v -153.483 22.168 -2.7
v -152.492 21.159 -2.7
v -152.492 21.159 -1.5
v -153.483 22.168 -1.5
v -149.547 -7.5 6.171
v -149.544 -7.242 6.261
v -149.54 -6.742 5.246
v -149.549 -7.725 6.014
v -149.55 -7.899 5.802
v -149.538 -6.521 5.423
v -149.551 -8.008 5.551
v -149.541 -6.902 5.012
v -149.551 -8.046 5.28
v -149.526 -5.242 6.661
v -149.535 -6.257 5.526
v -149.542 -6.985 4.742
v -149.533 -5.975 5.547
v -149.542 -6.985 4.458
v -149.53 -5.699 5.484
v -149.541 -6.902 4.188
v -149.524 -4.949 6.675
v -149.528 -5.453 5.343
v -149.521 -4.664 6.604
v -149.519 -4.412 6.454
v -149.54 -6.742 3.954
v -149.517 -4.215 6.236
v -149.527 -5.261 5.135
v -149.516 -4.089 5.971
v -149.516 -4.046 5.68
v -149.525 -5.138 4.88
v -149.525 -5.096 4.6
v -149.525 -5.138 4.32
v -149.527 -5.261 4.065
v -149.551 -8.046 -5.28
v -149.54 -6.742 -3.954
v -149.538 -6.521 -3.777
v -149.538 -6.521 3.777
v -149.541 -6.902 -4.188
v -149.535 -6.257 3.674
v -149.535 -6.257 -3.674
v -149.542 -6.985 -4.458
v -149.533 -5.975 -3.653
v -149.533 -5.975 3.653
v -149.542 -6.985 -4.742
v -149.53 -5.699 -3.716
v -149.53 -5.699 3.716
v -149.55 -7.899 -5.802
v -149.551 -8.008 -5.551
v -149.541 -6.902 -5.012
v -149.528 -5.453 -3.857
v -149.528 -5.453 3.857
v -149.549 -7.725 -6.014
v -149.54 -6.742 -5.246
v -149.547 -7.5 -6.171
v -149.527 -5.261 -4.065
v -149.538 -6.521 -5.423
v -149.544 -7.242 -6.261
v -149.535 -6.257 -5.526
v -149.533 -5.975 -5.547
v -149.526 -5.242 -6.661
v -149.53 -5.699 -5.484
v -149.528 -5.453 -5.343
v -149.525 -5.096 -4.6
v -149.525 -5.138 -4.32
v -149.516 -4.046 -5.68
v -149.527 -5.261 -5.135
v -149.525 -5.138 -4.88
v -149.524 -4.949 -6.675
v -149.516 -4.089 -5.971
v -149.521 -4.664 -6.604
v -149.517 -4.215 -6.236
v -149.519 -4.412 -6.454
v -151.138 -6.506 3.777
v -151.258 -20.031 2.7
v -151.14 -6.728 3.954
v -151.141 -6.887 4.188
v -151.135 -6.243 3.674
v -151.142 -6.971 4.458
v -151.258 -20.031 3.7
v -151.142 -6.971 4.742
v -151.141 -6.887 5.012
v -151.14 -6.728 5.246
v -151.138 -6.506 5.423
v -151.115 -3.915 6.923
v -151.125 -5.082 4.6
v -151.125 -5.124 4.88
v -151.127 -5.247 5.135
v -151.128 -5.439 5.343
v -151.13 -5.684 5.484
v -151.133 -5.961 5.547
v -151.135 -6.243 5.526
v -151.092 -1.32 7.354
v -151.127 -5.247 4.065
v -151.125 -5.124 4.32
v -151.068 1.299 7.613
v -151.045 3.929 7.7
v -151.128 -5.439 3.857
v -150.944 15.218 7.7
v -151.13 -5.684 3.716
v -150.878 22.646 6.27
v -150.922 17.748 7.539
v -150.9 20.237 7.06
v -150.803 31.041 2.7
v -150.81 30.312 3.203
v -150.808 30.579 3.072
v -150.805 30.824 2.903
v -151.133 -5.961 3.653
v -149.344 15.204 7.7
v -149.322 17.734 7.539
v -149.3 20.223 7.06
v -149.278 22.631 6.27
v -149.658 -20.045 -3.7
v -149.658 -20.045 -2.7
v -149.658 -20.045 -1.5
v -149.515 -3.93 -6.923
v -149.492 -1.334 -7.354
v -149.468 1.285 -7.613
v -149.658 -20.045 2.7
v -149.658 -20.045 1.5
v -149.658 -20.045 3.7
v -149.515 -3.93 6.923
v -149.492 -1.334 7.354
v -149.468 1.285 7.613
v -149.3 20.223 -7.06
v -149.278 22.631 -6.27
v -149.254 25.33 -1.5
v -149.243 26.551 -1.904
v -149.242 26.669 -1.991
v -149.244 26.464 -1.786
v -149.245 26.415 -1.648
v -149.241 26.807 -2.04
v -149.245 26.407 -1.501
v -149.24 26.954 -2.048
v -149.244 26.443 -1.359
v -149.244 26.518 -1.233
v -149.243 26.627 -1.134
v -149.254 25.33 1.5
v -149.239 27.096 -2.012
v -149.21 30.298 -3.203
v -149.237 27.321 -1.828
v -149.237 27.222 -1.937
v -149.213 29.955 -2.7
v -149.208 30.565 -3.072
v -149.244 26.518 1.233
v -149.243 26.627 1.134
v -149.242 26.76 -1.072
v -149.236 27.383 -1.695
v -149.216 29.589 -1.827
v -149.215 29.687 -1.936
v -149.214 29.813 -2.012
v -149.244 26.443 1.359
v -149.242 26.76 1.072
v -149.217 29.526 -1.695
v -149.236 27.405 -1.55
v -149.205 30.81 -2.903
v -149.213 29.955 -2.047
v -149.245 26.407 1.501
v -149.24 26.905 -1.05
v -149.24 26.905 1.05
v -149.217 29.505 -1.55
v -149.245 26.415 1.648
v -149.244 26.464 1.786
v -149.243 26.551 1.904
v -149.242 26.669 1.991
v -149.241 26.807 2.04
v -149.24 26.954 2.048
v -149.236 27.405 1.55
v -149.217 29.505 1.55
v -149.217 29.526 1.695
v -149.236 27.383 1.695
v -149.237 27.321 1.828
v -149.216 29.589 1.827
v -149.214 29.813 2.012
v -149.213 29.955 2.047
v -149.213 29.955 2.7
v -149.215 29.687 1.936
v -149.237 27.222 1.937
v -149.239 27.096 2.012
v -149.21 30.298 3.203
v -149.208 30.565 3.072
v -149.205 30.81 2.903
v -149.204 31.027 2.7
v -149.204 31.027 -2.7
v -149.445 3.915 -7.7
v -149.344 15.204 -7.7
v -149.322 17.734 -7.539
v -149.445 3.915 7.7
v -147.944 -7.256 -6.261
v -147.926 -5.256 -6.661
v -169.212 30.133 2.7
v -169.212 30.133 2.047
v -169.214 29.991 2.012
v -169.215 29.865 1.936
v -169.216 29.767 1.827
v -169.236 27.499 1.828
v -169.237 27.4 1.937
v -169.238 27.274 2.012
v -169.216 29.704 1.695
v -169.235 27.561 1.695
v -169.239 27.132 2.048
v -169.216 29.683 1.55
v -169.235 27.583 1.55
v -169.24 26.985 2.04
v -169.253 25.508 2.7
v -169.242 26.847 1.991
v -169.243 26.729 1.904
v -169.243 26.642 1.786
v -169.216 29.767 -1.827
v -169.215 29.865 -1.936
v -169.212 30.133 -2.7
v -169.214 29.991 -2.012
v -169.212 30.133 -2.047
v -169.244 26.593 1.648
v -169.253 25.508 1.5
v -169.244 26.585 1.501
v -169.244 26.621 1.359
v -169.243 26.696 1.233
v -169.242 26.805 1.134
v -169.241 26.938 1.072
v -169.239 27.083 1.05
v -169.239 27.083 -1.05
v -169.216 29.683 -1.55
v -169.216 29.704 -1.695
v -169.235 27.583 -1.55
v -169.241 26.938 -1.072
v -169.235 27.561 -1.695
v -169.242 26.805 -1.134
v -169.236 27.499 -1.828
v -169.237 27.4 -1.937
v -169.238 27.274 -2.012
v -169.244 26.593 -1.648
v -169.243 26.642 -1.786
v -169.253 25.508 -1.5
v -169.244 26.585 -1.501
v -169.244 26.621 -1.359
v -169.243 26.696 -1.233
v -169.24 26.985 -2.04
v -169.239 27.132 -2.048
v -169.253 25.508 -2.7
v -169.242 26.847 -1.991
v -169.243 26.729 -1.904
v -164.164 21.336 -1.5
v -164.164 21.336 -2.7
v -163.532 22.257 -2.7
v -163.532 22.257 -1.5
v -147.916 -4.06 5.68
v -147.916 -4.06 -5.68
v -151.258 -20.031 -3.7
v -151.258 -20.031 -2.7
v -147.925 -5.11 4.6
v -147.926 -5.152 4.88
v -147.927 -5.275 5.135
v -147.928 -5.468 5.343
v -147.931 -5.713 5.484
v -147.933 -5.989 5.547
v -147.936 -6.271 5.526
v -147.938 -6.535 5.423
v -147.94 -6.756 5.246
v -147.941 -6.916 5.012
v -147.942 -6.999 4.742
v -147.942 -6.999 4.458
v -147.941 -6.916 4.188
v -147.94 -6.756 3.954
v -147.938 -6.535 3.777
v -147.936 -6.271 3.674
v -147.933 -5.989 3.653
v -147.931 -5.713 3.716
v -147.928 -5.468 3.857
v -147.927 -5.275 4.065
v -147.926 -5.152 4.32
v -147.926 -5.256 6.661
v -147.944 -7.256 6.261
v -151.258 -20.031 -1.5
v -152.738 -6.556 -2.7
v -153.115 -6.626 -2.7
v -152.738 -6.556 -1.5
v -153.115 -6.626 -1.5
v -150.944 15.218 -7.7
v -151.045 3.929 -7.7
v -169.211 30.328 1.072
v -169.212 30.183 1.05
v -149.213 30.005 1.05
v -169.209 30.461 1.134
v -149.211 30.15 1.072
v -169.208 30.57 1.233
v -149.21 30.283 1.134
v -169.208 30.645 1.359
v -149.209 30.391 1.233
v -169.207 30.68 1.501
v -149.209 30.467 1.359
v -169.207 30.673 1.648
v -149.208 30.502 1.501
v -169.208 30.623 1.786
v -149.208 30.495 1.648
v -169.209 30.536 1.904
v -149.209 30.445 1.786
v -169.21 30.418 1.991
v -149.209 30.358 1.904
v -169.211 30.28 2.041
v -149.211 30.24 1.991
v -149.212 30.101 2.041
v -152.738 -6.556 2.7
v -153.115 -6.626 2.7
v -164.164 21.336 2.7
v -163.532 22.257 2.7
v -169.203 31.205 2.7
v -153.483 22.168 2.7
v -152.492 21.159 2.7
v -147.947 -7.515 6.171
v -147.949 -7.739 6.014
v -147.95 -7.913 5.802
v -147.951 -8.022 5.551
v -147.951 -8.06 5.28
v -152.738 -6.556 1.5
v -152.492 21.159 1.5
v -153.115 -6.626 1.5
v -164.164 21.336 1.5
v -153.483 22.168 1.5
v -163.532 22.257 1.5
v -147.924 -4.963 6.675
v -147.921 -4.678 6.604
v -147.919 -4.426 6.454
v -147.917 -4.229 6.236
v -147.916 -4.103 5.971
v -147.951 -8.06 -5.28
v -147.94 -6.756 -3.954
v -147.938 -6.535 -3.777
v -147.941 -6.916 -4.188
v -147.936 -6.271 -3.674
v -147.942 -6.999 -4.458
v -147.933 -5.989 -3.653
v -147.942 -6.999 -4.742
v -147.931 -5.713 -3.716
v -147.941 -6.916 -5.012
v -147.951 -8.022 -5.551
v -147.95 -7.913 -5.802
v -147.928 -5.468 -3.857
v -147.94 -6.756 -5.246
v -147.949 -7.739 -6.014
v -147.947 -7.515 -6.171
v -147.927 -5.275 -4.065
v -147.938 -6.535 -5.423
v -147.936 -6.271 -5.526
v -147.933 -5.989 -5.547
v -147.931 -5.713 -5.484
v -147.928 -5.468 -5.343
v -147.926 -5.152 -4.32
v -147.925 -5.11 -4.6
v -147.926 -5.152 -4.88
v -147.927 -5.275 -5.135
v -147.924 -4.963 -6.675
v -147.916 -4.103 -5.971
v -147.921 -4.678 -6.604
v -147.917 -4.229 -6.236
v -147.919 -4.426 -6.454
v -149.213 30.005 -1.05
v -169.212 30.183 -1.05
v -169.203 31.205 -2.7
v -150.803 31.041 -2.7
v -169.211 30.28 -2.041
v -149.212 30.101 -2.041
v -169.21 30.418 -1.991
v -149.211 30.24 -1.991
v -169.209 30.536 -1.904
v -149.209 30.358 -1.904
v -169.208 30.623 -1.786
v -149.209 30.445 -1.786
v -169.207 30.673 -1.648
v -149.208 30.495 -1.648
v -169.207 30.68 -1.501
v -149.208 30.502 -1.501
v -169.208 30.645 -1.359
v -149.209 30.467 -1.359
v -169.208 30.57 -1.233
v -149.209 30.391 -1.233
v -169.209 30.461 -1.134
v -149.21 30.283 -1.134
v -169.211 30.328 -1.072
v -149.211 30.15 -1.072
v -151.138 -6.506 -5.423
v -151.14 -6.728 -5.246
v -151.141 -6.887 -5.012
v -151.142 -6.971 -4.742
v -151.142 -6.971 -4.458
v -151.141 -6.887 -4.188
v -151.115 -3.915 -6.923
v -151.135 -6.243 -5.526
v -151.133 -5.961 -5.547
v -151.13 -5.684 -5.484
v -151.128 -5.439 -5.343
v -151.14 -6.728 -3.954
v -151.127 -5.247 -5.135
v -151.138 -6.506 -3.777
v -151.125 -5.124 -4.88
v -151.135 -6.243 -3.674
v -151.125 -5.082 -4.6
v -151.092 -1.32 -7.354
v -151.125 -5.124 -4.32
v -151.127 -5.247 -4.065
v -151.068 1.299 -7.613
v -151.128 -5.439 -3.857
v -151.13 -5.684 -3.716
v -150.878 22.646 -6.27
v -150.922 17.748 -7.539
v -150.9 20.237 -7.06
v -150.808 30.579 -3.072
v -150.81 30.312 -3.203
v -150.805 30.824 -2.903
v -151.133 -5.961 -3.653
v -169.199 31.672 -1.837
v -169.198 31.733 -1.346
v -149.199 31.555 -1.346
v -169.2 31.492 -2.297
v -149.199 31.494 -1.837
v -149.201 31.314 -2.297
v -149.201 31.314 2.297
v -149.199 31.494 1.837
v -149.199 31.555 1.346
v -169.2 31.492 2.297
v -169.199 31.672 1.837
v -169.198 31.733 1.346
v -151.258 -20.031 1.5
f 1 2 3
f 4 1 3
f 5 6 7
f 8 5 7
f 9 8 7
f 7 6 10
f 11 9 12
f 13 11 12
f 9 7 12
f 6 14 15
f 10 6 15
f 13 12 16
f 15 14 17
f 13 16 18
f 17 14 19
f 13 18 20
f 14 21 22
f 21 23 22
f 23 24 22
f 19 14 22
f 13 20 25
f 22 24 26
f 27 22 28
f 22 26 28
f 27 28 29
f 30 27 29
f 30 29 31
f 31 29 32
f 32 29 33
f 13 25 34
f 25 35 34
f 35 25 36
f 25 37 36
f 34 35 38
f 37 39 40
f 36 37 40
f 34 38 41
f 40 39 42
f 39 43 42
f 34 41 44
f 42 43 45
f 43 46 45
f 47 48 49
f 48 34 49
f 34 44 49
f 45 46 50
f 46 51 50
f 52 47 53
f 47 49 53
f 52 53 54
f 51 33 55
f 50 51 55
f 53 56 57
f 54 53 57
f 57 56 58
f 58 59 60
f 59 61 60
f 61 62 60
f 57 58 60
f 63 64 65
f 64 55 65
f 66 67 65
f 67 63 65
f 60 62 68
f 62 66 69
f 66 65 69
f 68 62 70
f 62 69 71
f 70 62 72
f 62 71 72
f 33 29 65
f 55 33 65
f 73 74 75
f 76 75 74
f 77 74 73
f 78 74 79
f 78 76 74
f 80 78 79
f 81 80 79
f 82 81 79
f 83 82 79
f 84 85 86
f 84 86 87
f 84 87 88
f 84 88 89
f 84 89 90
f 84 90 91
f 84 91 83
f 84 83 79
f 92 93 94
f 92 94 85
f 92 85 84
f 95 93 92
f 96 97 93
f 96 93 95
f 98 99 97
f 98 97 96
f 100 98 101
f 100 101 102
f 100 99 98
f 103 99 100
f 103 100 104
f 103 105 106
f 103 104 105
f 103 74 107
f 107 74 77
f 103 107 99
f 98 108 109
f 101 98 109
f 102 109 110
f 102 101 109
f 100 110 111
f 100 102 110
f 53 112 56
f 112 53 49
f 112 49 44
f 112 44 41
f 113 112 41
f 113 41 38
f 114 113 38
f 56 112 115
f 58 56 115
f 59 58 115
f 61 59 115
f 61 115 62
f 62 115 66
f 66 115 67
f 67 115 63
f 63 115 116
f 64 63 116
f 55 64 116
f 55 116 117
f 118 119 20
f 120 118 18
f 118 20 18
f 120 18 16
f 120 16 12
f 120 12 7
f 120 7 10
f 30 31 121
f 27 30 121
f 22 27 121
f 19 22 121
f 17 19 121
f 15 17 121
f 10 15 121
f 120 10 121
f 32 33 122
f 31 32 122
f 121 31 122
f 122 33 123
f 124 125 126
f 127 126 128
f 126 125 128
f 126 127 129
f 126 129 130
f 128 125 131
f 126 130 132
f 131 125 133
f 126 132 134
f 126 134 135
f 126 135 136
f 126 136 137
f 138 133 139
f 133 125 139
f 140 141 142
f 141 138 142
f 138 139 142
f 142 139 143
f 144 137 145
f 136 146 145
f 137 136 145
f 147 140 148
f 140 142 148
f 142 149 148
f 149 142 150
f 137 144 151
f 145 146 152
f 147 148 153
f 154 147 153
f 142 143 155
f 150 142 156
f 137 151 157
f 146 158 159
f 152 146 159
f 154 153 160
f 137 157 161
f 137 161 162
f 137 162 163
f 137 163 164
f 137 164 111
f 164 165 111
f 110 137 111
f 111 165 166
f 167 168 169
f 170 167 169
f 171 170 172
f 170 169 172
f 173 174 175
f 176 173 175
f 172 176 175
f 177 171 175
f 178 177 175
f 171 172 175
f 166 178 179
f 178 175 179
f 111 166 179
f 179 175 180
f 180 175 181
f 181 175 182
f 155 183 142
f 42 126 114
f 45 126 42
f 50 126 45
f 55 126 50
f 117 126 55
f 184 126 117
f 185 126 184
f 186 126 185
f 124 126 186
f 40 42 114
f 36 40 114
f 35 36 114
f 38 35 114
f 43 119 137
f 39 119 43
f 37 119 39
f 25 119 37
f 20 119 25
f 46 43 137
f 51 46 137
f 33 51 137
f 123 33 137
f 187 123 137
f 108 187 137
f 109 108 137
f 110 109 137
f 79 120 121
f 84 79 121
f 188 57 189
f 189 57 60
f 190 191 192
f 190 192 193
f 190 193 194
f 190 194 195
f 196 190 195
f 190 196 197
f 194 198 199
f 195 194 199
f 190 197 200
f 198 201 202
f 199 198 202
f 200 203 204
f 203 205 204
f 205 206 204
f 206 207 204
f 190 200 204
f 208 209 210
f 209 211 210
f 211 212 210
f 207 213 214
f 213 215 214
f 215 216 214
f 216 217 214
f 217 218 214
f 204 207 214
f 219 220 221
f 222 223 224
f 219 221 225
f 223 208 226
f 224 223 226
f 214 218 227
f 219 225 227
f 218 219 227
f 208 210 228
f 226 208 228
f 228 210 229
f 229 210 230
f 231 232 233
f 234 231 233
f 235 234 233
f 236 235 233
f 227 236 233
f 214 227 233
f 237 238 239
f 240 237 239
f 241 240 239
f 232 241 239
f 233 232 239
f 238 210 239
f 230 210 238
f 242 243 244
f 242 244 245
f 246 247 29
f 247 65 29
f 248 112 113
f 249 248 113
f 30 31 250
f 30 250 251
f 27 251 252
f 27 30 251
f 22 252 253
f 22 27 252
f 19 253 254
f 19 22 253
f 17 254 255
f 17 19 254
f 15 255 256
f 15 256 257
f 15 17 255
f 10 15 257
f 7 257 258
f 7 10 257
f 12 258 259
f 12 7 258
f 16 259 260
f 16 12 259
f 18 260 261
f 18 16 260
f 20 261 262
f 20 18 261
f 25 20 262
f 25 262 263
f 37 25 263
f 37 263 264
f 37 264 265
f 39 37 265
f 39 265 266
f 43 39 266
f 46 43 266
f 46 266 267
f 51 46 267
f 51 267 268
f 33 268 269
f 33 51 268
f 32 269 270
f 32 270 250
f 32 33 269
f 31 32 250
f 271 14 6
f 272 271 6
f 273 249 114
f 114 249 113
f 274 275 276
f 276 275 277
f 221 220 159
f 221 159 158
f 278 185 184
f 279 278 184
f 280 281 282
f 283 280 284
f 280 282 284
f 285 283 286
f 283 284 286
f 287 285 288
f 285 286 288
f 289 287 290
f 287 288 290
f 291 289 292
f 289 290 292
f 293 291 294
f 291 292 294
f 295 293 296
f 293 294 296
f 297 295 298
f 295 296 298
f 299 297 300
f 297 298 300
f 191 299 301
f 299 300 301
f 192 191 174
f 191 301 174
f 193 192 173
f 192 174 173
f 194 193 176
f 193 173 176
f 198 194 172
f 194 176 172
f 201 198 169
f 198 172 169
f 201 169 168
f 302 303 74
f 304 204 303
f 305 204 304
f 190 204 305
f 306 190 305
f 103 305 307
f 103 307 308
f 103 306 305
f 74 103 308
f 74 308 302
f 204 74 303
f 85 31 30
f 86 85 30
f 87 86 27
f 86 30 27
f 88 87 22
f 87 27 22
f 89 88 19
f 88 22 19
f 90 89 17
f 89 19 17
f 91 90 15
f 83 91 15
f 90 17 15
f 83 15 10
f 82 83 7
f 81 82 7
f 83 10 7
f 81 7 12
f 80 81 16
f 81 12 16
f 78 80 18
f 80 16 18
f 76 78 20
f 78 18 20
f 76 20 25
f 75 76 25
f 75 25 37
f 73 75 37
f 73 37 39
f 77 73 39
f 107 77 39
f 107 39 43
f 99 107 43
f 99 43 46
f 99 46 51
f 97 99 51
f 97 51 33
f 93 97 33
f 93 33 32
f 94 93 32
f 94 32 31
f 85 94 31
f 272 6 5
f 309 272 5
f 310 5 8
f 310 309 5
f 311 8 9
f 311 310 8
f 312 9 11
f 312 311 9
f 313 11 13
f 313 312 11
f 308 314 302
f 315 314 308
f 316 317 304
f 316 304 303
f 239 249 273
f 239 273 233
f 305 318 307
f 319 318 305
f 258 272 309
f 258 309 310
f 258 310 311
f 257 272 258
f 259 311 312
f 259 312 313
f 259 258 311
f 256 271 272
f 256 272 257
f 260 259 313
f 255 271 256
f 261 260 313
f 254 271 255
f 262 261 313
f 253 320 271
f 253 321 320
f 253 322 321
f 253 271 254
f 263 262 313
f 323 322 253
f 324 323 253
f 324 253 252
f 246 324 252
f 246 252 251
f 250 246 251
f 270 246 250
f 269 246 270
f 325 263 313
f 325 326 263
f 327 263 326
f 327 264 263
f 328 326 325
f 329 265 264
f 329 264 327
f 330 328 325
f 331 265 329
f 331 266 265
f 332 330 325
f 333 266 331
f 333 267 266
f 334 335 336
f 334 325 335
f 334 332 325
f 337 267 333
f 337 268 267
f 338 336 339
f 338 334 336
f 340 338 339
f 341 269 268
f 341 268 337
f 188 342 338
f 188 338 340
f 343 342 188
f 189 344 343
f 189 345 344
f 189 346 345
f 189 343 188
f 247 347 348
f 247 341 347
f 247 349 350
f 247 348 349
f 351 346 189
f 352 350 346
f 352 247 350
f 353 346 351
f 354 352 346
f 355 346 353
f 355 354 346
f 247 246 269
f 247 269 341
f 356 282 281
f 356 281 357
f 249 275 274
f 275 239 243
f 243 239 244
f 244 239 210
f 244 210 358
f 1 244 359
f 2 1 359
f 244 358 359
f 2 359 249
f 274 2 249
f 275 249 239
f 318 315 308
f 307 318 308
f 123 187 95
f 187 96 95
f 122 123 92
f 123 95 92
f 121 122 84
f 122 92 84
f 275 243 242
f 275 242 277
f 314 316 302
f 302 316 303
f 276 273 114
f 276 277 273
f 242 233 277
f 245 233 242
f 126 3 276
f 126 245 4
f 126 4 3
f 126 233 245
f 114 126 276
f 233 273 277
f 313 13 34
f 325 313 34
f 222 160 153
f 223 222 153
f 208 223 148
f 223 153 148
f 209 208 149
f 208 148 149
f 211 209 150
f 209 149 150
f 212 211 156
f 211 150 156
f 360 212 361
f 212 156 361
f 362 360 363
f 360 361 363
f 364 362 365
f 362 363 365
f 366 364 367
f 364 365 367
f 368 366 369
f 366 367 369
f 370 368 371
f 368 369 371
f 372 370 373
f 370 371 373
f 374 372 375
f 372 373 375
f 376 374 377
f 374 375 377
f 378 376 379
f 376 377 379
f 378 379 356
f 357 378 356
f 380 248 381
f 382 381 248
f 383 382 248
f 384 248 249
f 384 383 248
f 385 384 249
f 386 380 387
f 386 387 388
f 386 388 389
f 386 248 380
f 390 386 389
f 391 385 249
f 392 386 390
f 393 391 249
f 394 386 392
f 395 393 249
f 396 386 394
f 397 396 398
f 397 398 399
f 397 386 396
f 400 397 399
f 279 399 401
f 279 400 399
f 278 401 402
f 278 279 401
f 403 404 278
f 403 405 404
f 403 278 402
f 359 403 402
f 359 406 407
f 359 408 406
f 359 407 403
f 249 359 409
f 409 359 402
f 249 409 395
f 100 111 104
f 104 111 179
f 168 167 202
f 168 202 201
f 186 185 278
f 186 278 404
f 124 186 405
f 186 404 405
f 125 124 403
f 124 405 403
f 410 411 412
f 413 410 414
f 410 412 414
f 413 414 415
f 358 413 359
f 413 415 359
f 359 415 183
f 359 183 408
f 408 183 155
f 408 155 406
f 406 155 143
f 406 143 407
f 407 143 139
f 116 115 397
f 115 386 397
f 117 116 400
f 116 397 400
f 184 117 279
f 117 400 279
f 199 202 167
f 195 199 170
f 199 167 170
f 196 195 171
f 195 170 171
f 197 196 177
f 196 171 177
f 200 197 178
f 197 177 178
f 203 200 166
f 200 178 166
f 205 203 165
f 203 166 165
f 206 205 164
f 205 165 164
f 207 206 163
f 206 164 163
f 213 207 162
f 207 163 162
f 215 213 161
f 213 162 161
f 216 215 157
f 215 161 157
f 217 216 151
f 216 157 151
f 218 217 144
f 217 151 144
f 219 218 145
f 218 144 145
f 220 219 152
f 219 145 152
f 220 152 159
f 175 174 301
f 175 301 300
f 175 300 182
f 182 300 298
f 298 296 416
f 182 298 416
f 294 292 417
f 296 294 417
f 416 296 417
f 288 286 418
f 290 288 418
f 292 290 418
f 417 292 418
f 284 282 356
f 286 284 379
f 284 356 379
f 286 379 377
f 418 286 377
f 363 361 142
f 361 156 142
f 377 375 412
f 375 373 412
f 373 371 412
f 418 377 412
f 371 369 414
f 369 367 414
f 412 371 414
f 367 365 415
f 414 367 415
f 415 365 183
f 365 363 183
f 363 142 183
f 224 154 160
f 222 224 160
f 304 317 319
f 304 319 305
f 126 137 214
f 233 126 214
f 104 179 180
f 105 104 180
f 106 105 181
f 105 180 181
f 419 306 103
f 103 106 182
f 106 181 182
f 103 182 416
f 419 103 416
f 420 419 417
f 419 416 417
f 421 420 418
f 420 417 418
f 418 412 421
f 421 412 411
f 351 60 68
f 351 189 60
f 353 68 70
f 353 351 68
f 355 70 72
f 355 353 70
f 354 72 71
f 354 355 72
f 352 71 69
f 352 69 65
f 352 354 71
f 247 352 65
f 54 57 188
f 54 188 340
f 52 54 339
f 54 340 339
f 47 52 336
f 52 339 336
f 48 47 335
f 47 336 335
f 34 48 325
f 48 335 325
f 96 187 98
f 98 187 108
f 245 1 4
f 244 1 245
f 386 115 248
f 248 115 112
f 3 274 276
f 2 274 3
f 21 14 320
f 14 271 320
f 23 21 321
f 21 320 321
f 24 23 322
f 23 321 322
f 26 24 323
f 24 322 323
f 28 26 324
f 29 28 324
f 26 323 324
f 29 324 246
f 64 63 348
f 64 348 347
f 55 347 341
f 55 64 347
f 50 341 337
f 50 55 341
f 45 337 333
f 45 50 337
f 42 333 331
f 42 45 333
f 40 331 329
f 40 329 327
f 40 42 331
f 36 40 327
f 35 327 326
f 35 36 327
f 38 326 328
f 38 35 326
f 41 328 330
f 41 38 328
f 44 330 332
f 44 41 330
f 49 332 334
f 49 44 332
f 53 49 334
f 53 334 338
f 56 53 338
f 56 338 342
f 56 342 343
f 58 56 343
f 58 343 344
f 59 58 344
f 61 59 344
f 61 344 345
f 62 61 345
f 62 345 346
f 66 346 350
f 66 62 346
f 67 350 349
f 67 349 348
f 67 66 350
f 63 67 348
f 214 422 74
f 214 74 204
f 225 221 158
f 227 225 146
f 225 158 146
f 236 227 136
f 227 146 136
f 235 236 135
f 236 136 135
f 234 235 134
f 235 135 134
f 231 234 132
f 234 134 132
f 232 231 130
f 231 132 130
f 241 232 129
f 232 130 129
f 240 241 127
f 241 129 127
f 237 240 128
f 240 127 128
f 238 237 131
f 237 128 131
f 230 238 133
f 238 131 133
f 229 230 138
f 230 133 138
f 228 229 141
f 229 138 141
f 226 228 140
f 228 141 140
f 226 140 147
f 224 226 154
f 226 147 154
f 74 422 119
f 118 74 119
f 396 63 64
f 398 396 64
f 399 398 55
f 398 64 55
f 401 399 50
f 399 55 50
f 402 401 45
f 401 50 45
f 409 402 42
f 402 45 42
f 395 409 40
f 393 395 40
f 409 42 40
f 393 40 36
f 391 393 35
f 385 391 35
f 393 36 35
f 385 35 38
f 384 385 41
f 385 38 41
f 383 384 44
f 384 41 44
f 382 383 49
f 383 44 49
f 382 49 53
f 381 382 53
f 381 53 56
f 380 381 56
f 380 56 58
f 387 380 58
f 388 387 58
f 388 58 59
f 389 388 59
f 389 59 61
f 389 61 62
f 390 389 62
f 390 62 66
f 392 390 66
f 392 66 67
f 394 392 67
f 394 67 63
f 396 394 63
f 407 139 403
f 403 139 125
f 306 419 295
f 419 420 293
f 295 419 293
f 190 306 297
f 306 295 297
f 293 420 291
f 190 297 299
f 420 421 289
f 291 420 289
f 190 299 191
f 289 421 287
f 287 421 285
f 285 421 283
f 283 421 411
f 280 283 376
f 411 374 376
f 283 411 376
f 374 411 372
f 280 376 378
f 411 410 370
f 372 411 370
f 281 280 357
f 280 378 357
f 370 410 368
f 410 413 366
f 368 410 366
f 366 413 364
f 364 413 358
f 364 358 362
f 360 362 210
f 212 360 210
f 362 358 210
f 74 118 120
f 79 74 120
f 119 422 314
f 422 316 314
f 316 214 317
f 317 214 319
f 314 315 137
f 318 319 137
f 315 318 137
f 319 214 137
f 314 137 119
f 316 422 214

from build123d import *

# Parameters (mm, degrees)
BOSS_EXTRUDE1_DEPTH      = 1.5
BOSS_EXTRUDE2_DEPTH      = 2.7
BOSS_EXTRUDE2_DEPTH_BACK = 2.7
CUT_EXTRUDE1_DEPTH       = 1.5
BOSS_EXTRUDE3_DEPTH      = 1.6
CUT_EXTRUDE2_DEPTH       = 173.771231485
CUT_EXTRUDE2_DEPTH_BACK  = 173.771231485
CUT_EXTRUDE3_DEPTH       = 1.5
SKETCH9_W                = 3.1
SKETCH9_H                = 3.1
SKETCH9_W_2              = 3
SKETCH9_H_2              = 3
CUT_EXTRUDE4_DEPTH       = 38.081608425
SKETCH10_R               = 0.5
CUT_EXTRUDE5_DEPTH       = 38.081608425
CUT_EXTRUDE6_DEPTH       = 38.081608425
FILLET1_R                = 20
CUT_EXTRUDE7_DEPTH       = 38.081608425
FILLET2_R                = 40
SKETCH14_R               = 0.95
SKETCH14_W               = 1.2
SKETCH14_H               = 4
SKETCH14_W_2             = 3
BOSS_EXTRUDE4_DEPTH      = 1.6
SKETCH15_R               = 0.95
CUT_EXTRUDE8_DEPTH       = 38.081608425
FILLET3_R                = 1
CUT_EXTRUDE9_DEPTH       = 173.374562434
CUT_EXTRUDE9_DEPTH_BACK  = 173.374562434
CHAMFER1_SIZE            = 1


with BuildPart() as part:
    # Sketch3 → Boss-Extrude1 (new, symmetric)
    with BuildSketch(Plane.XY):
        Polygon((-149.213067775, 29.954800958), (-159.212671499, 30.043825512), (-159.65781191, -19.956174488), (-149.658208186, -20.045199042), align=None)
        Polygon((-159.65781191, -19.956174488), (-159.212671499, 30.043825512), (-169.212275222, 30.132850067), (-169.657415633, -19.867149933), align=None)
        Polygon((-149.198823847, 31.554737554), (-169.198031294, 31.732786662), (-169.212275222, 30.132850067), (-149.213067775, 29.954800958), align=None)
    extrude(amount=BOSS_EXTRUDE1_DEPTH, both=True)

    # Sketch4 → Boss-Extrude2 (add, two sides: drawn at the far end of the back side and taken through both)
    with BuildSketch(Plane.XY.offset(-BOSS_EXTRUDE2_DEPTH_BACK)):
        Polygon((-149.213067775, 29.954800958), (-159.212671499, 30.043825512), (-159.65781191, -19.956174488), (-149.658208186, -20.045199042), align=None)
        Polygon((-159.212671499, 30.043825512), (-169.212275222, 30.132850067), (-169.657415633, -19.867149933), (-159.65781191, -19.956174488), align=None)
        Polygon((-149.198823847, 31.554737554), (-169.198031294, 31.732786662), (-169.212275222, 30.132850067), (-149.213067775, 29.954800958), align=None)
    extrude(amount=BOSS_EXTRUDE2_DEPTH + BOSS_EXTRUDE2_DEPTH_BACK)

    # Sketch5 → Cut-Extrude1 (cut, symmetric)
    with BuildSketch(Plane.XY):
        Polygon((-149.658208186, -20.045199042), (-149.254241632, 25.329984236), (-169.253449079, 25.508033344), (-169.657415633, -19.867149933), align=None)
    extrude(amount=CUT_EXTRUDE1_DEPTH, both=True, mode=Mode.SUBTRACT)

    # Sketch6 → Boss-Extrude3 (add)
    with BuildSketch(Plane(origin=(-149.467902798, 1.330684074, 0), x_dir=(0, 0, -1), z_dir=(0.999960372358546, -0.00890245542299091, 0))):
        Polygon((-2.7, 30.225251236), (-2.7, -21.376730225), (-7.7, -21.376730225), (-7.7, 17.725251236), align=None)
        Polygon((2.7, -21.376730225), (2.7, 30.225251236), (7.7, 17.725251236), (7.7, -21.376730225), align=None)
    extrude(amount=-BOSS_EXTRUDE3_DEPTH)

    # Sketch7 → Cut-Extrude2 (cut, two sides: drawn at the far end of the back side and taken through both)
    with BuildSketch(Plane.XY.offset(-CUT_EXTRUDE2_DEPTH_BACK)):
        Polygon((-151.258144782, -20.030955113), (-169.253449079, 25.508033344), (-169.657415633, -19.867149933), align=None)
    extrude(amount=CUT_EXTRUDE2_DEPTH + CUT_EXTRUDE2_DEPTH_BACK, mode=Mode.SUBTRACT)

    # Sketch8 → Cut-Extrude3 (cut, symmetric)
    with BuildSketch(Plane.XY):
        Polygon((-371.727094297, 31.935800663), (-371.753801663, 28.935919545), (-39.244134182, 25.975649744), (-39.217426816, 28.975530862), align=None)
    extrude(amount=CUT_EXTRUDE3_DEPTH, both=True, mode=Mode.SUBTRACT)

    # Sketch9 → Cut-Extrude4 (cut, through all)
    with BuildSketch(Plane(origin=(-149.467902798, 1.330684074, 0), x_dir=(0, 0, -1), z_dir=(0.999960372358546, -0.00890245542299091, 0))):
        with Locations((0, 27.125251236)):
            Rectangle(SKETCH9_W, SKETCH9_H)
        with Locations((0, 27.125251236)):
            Rectangle(SKETCH9_W_2, SKETCH9_H_2, mode=Mode.SUBTRACT)
    extrude(amount=-CUT_EXTRUDE4_DEPTH, mode=Mode.SUBTRACT)

    # Sketch10 → Cut-Extrude5 (cut, through all)
    with BuildSketch(Plane(origin=(-149.467902798, 1.330684074, 0), x_dir=(0, 0, -1), z_dir=(0.999960372358546, -0.00890245542299091, 0))):
        with Locations((-1.55, 25.575251236)):
            Circle(SKETCH10_R)
        with Locations((1.55, 25.575251236)):
            Circle(SKETCH10_R)
        with Locations((-1.55, 28.675251236)):
            Circle(SKETCH10_R)
        with Locations((1.55, 28.675251236)):
            Circle(SKETCH10_R)
    extrude(amount=-CUT_EXTRUDE5_DEPTH, mode=Mode.SUBTRACT)

    # Sketch12 → Cut-Extrude6 (cut, through all)
    with BuildSketch(Plane(origin=(-149.467902798, 1.330684074, 0), x_dir=(0, 0, -1), z_dir=(0.999960372358546, -0.00890245542299091, 0))):
        with BuildLine():
            Line((-2.7, 30.225251236), (-3.202887459, 28.968032588))
            ThreePointArc((-3.202887459, 28.968032588), (-2.467191696, 29.881385696), (-1.345934077, 30.225251236))
            Line((-1.345934077, 30.225251236), (-2.7, 30.225251236))
        make_face()
        with BuildLine():
            ThreePointArc((1.345934077, 30.225251236), (2.467191696, 29.881385696), (3.202887459, 28.968032588))
            Line((3.202887459, 28.968032588), (2.7, 30.225251236))
            Line((2.7, 30.225251236), (1.345934077, 30.225251236))
        make_face()
    extrude(amount=-CUT_EXTRUDE6_DEPTH, mode=Mode.SUBTRACT)

    # Fillet1
    fillet1_edges = [part.edges().sort_by_distance(p)[0] for p in [
        (-150.110072837, 19.062354864, 7.7),
        (-150.110072837, 19.062354864, -7.7),
    ]]
    fillet(fillet1_edges, radius=FILLET1_R)

    # Sketch13 → Cut-Extrude7 (cut, through all)
    with BuildSketch(Plane(origin=(-149.467902798, 1.330684074, 0), x_dir=(0, 0, -1), z_dir=(0.999960372358546, -0.00890245542299091, 0))):
        Polygon((-7.7, -1.376730225), (-7.7, -21.376730225), (-3.7, -21.376730225), align=None)
        Polygon((7.7, -21.376730225), (7.7, -1.376730225), (3.7, -21.376730225), align=None)
    extrude(amount=-CUT_EXTRUDE7_DEPTH, mode=Mode.SUBTRACT)

    # Fillet2
    fillet2_edges = [part.edges().sort_by_distance(p)[0] for p in [
        (-150.280127376, -0.03886963, -7.7),
        (-150.280127376, -0.03886963, 7.7),
    ]]
    fillet(fillet2_edges, radius=FILLET2_R)

    # Sketch15 → Cut-Extrude8 (cut, through all)
    with BuildSketch(Plane(origin=(-149.467902798, 1.330684074, 0), x_dir=(0, 0, -1), z_dir=(0.999960372358546, -0.00890245542299091, 0))):
        with Locations(Location((-4.6, -7.376730225, 0), (0, 0, 90))):
            Circle(SKETCH15_R)
        with Locations(Location((4.6, -7.376730225, 0), (0, 0, 90))):
            Circle(SKETCH15_R)
    extrude(amount=-CUT_EXTRUDE8_DEPTH, mode=Mode.SUBTRACT)

    # Sketch16 → Cut-Extrude9 (cut, two sides: drawn at the far end of the back side and taken through both)
    with BuildSketch(Plane.XY.offset(-CUT_EXTRUDE9_DEPTH_BACK)):
        Polygon((-164.531480082, 22.265867746), (-152.747142701, -7.555623189), (-152.48260268, 22.158598902), align=None)
    extrude(amount=CUT_EXTRUDE9_DEPTH + CUT_EXTRUDE9_DEPTH_BACK, mode=Mode.SUBTRACT)

    # Chamfer1
    chamfer1_edges = [part.edges().sort_by_distance(p)[0] for p in [
        (-152.747142701, -7.555623189, -2.1),
        (-152.747142701, -7.555623189, 2.1),
        (-164.531480082, 22.265867746, -2.1),
        (-164.531480082, 22.265867746, 2.1),
        (-152.48260268, 22.158598902, -2.1),
        (-152.48260268, 22.158598902, 2.1),
    ]]
    chamfer(chamfer1_edges, length=CHAMFER1_SIZE)


with BuildPart() as body_2:
    # Sketch14 → Boss-Extrude4 (new body)
    # profile 1 of 5: a face of its own
    with BuildSketch(Plane(origin=(-149.467902798, 1.330684074, 0), x_dir=(0, 0, -1), z_dir=(0.999960372358546, -0.00890245542299091, 0))):
        Polygon((-2.7, -9.376730225), (-2.7, -5.376730225), (-6.9, -5.376730225), (-6.1, -9.376730225), align=None)
        with Locations(Location((-4.6, -7.376730225, 0), (0, 0, 90))):
            Circle(SKETCH14_R, mode=Mode.SUBTRACT)
    # profile 2 of 5: a face of its own
    with BuildSketch(Plane(origin=(-149.467902798, 1.330684074, 0), x_dir=(0, 0, -1), z_dir=(0.999960372358546, -0.00890245542299091, 0))):
        with Locations((-2.1, -7.376730225)):
            Rectangle(SKETCH14_W, SKETCH14_H)
    # profile 3 of 5: a face of its own
    with BuildSketch(Plane(origin=(-149.467902798, 1.330684074, 0), x_dir=(0, 0, -1), z_dir=(0.999960372358546, -0.00890245542299091, 0))):
        with Locations((0, -7.376730225)):
            Rectangle(SKETCH14_W_2, SKETCH14_H)
    # profile 4 of 5: a face of its own
    with BuildSketch(Plane(origin=(-149.467902798, 1.330684074, 0), x_dir=(0, 0, -1), z_dir=(0.999960372358546, -0.00890245542299091, 0))):
        with Locations((2.1, -7.376730225)):
            Rectangle(SKETCH14_W, SKETCH14_H)
    # profile 5 of 5: a face of its own
    with BuildSketch(Plane(origin=(-149.467902798, 1.330684074, 0), x_dir=(0, 0, -1), z_dir=(0.999960372358546, -0.00890245542299091, 0))):
        Polygon((6.1, -9.376730225), (6.9, -5.376730225), (2.7, -5.376730225), (2.7, -9.376730225), align=None)
        with Locations(Location((4.6, -7.376730225, 0), (0, 0, 90))):
            Circle(SKETCH14_R, mode=Mode.SUBTRACT)
    extrude(amount=BOSS_EXTRUDE4_DEPTH)

    # Fillet3
    fillet3_edges = [body_2.edges().sort_by_distance(p)[0] for p in [
        (-148.715800602, -4.052955049, -6.9),
        (-148.751410423, -8.052796538, -6.1),
        (-148.751410423, -8.052796538, 6.1),
        (-148.715800602, -4.052955049, 6.9),
    ]]
    fillet(fillet3_edges, radius=FILLET3_R)


solid = Compound([part.part, body_2.part])
